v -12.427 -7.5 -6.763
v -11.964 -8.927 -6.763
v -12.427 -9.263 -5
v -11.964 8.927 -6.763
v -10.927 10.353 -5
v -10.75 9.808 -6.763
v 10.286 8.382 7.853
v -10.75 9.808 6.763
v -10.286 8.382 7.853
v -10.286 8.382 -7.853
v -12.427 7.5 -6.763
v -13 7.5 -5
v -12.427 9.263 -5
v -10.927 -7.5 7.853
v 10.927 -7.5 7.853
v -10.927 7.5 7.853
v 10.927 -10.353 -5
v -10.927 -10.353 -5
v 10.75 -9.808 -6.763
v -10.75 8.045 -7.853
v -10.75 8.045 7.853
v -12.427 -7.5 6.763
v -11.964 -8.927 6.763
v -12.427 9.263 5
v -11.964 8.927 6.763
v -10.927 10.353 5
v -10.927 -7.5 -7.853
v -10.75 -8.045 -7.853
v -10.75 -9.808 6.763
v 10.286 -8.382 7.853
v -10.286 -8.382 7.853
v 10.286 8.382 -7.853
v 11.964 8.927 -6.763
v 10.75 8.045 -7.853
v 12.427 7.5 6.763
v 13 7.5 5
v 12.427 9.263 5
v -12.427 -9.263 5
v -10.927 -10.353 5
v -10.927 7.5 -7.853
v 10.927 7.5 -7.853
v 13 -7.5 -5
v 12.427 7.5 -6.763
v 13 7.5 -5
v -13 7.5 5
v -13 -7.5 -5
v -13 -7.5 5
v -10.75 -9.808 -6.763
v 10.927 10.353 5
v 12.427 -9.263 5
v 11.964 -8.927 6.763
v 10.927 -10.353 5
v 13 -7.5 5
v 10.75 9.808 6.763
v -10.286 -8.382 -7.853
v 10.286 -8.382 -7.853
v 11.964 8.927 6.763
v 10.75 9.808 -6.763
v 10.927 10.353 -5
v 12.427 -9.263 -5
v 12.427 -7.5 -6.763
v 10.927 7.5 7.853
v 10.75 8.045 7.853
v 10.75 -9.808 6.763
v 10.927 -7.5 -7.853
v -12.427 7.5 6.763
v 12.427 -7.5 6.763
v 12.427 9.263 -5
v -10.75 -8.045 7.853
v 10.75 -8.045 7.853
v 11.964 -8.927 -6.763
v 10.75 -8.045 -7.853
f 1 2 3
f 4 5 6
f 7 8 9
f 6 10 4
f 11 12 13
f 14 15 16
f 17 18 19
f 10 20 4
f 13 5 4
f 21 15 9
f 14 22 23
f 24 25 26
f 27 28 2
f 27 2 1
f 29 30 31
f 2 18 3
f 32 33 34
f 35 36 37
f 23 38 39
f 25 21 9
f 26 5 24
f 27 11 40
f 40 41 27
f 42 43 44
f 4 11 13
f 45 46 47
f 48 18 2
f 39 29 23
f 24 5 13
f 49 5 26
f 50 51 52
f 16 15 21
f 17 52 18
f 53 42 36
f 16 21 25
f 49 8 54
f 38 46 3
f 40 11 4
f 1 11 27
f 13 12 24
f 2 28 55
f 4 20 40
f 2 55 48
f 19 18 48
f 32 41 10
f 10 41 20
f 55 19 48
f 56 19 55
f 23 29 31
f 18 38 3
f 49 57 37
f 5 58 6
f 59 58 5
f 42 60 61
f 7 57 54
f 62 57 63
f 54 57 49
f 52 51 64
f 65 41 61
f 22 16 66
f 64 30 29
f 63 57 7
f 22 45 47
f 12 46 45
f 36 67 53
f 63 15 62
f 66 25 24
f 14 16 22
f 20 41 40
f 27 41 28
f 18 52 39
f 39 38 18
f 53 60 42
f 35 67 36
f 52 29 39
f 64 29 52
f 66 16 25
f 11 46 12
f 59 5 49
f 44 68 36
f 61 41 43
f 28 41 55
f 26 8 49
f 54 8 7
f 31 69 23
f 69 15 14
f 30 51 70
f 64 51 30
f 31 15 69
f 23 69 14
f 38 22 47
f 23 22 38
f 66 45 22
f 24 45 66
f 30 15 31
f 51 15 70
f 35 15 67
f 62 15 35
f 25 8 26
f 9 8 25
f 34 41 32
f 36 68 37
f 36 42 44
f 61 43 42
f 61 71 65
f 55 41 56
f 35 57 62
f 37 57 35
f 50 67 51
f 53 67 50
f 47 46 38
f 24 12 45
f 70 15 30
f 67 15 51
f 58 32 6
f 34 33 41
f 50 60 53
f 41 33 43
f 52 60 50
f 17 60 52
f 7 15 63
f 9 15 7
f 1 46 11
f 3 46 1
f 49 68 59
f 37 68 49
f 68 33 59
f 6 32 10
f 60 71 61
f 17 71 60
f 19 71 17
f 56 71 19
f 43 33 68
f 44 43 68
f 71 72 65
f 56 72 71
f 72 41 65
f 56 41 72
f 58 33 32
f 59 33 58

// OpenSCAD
minkowski() {
    cube([20, 15, 10], center = true);
    sphere(r = 3);
}
